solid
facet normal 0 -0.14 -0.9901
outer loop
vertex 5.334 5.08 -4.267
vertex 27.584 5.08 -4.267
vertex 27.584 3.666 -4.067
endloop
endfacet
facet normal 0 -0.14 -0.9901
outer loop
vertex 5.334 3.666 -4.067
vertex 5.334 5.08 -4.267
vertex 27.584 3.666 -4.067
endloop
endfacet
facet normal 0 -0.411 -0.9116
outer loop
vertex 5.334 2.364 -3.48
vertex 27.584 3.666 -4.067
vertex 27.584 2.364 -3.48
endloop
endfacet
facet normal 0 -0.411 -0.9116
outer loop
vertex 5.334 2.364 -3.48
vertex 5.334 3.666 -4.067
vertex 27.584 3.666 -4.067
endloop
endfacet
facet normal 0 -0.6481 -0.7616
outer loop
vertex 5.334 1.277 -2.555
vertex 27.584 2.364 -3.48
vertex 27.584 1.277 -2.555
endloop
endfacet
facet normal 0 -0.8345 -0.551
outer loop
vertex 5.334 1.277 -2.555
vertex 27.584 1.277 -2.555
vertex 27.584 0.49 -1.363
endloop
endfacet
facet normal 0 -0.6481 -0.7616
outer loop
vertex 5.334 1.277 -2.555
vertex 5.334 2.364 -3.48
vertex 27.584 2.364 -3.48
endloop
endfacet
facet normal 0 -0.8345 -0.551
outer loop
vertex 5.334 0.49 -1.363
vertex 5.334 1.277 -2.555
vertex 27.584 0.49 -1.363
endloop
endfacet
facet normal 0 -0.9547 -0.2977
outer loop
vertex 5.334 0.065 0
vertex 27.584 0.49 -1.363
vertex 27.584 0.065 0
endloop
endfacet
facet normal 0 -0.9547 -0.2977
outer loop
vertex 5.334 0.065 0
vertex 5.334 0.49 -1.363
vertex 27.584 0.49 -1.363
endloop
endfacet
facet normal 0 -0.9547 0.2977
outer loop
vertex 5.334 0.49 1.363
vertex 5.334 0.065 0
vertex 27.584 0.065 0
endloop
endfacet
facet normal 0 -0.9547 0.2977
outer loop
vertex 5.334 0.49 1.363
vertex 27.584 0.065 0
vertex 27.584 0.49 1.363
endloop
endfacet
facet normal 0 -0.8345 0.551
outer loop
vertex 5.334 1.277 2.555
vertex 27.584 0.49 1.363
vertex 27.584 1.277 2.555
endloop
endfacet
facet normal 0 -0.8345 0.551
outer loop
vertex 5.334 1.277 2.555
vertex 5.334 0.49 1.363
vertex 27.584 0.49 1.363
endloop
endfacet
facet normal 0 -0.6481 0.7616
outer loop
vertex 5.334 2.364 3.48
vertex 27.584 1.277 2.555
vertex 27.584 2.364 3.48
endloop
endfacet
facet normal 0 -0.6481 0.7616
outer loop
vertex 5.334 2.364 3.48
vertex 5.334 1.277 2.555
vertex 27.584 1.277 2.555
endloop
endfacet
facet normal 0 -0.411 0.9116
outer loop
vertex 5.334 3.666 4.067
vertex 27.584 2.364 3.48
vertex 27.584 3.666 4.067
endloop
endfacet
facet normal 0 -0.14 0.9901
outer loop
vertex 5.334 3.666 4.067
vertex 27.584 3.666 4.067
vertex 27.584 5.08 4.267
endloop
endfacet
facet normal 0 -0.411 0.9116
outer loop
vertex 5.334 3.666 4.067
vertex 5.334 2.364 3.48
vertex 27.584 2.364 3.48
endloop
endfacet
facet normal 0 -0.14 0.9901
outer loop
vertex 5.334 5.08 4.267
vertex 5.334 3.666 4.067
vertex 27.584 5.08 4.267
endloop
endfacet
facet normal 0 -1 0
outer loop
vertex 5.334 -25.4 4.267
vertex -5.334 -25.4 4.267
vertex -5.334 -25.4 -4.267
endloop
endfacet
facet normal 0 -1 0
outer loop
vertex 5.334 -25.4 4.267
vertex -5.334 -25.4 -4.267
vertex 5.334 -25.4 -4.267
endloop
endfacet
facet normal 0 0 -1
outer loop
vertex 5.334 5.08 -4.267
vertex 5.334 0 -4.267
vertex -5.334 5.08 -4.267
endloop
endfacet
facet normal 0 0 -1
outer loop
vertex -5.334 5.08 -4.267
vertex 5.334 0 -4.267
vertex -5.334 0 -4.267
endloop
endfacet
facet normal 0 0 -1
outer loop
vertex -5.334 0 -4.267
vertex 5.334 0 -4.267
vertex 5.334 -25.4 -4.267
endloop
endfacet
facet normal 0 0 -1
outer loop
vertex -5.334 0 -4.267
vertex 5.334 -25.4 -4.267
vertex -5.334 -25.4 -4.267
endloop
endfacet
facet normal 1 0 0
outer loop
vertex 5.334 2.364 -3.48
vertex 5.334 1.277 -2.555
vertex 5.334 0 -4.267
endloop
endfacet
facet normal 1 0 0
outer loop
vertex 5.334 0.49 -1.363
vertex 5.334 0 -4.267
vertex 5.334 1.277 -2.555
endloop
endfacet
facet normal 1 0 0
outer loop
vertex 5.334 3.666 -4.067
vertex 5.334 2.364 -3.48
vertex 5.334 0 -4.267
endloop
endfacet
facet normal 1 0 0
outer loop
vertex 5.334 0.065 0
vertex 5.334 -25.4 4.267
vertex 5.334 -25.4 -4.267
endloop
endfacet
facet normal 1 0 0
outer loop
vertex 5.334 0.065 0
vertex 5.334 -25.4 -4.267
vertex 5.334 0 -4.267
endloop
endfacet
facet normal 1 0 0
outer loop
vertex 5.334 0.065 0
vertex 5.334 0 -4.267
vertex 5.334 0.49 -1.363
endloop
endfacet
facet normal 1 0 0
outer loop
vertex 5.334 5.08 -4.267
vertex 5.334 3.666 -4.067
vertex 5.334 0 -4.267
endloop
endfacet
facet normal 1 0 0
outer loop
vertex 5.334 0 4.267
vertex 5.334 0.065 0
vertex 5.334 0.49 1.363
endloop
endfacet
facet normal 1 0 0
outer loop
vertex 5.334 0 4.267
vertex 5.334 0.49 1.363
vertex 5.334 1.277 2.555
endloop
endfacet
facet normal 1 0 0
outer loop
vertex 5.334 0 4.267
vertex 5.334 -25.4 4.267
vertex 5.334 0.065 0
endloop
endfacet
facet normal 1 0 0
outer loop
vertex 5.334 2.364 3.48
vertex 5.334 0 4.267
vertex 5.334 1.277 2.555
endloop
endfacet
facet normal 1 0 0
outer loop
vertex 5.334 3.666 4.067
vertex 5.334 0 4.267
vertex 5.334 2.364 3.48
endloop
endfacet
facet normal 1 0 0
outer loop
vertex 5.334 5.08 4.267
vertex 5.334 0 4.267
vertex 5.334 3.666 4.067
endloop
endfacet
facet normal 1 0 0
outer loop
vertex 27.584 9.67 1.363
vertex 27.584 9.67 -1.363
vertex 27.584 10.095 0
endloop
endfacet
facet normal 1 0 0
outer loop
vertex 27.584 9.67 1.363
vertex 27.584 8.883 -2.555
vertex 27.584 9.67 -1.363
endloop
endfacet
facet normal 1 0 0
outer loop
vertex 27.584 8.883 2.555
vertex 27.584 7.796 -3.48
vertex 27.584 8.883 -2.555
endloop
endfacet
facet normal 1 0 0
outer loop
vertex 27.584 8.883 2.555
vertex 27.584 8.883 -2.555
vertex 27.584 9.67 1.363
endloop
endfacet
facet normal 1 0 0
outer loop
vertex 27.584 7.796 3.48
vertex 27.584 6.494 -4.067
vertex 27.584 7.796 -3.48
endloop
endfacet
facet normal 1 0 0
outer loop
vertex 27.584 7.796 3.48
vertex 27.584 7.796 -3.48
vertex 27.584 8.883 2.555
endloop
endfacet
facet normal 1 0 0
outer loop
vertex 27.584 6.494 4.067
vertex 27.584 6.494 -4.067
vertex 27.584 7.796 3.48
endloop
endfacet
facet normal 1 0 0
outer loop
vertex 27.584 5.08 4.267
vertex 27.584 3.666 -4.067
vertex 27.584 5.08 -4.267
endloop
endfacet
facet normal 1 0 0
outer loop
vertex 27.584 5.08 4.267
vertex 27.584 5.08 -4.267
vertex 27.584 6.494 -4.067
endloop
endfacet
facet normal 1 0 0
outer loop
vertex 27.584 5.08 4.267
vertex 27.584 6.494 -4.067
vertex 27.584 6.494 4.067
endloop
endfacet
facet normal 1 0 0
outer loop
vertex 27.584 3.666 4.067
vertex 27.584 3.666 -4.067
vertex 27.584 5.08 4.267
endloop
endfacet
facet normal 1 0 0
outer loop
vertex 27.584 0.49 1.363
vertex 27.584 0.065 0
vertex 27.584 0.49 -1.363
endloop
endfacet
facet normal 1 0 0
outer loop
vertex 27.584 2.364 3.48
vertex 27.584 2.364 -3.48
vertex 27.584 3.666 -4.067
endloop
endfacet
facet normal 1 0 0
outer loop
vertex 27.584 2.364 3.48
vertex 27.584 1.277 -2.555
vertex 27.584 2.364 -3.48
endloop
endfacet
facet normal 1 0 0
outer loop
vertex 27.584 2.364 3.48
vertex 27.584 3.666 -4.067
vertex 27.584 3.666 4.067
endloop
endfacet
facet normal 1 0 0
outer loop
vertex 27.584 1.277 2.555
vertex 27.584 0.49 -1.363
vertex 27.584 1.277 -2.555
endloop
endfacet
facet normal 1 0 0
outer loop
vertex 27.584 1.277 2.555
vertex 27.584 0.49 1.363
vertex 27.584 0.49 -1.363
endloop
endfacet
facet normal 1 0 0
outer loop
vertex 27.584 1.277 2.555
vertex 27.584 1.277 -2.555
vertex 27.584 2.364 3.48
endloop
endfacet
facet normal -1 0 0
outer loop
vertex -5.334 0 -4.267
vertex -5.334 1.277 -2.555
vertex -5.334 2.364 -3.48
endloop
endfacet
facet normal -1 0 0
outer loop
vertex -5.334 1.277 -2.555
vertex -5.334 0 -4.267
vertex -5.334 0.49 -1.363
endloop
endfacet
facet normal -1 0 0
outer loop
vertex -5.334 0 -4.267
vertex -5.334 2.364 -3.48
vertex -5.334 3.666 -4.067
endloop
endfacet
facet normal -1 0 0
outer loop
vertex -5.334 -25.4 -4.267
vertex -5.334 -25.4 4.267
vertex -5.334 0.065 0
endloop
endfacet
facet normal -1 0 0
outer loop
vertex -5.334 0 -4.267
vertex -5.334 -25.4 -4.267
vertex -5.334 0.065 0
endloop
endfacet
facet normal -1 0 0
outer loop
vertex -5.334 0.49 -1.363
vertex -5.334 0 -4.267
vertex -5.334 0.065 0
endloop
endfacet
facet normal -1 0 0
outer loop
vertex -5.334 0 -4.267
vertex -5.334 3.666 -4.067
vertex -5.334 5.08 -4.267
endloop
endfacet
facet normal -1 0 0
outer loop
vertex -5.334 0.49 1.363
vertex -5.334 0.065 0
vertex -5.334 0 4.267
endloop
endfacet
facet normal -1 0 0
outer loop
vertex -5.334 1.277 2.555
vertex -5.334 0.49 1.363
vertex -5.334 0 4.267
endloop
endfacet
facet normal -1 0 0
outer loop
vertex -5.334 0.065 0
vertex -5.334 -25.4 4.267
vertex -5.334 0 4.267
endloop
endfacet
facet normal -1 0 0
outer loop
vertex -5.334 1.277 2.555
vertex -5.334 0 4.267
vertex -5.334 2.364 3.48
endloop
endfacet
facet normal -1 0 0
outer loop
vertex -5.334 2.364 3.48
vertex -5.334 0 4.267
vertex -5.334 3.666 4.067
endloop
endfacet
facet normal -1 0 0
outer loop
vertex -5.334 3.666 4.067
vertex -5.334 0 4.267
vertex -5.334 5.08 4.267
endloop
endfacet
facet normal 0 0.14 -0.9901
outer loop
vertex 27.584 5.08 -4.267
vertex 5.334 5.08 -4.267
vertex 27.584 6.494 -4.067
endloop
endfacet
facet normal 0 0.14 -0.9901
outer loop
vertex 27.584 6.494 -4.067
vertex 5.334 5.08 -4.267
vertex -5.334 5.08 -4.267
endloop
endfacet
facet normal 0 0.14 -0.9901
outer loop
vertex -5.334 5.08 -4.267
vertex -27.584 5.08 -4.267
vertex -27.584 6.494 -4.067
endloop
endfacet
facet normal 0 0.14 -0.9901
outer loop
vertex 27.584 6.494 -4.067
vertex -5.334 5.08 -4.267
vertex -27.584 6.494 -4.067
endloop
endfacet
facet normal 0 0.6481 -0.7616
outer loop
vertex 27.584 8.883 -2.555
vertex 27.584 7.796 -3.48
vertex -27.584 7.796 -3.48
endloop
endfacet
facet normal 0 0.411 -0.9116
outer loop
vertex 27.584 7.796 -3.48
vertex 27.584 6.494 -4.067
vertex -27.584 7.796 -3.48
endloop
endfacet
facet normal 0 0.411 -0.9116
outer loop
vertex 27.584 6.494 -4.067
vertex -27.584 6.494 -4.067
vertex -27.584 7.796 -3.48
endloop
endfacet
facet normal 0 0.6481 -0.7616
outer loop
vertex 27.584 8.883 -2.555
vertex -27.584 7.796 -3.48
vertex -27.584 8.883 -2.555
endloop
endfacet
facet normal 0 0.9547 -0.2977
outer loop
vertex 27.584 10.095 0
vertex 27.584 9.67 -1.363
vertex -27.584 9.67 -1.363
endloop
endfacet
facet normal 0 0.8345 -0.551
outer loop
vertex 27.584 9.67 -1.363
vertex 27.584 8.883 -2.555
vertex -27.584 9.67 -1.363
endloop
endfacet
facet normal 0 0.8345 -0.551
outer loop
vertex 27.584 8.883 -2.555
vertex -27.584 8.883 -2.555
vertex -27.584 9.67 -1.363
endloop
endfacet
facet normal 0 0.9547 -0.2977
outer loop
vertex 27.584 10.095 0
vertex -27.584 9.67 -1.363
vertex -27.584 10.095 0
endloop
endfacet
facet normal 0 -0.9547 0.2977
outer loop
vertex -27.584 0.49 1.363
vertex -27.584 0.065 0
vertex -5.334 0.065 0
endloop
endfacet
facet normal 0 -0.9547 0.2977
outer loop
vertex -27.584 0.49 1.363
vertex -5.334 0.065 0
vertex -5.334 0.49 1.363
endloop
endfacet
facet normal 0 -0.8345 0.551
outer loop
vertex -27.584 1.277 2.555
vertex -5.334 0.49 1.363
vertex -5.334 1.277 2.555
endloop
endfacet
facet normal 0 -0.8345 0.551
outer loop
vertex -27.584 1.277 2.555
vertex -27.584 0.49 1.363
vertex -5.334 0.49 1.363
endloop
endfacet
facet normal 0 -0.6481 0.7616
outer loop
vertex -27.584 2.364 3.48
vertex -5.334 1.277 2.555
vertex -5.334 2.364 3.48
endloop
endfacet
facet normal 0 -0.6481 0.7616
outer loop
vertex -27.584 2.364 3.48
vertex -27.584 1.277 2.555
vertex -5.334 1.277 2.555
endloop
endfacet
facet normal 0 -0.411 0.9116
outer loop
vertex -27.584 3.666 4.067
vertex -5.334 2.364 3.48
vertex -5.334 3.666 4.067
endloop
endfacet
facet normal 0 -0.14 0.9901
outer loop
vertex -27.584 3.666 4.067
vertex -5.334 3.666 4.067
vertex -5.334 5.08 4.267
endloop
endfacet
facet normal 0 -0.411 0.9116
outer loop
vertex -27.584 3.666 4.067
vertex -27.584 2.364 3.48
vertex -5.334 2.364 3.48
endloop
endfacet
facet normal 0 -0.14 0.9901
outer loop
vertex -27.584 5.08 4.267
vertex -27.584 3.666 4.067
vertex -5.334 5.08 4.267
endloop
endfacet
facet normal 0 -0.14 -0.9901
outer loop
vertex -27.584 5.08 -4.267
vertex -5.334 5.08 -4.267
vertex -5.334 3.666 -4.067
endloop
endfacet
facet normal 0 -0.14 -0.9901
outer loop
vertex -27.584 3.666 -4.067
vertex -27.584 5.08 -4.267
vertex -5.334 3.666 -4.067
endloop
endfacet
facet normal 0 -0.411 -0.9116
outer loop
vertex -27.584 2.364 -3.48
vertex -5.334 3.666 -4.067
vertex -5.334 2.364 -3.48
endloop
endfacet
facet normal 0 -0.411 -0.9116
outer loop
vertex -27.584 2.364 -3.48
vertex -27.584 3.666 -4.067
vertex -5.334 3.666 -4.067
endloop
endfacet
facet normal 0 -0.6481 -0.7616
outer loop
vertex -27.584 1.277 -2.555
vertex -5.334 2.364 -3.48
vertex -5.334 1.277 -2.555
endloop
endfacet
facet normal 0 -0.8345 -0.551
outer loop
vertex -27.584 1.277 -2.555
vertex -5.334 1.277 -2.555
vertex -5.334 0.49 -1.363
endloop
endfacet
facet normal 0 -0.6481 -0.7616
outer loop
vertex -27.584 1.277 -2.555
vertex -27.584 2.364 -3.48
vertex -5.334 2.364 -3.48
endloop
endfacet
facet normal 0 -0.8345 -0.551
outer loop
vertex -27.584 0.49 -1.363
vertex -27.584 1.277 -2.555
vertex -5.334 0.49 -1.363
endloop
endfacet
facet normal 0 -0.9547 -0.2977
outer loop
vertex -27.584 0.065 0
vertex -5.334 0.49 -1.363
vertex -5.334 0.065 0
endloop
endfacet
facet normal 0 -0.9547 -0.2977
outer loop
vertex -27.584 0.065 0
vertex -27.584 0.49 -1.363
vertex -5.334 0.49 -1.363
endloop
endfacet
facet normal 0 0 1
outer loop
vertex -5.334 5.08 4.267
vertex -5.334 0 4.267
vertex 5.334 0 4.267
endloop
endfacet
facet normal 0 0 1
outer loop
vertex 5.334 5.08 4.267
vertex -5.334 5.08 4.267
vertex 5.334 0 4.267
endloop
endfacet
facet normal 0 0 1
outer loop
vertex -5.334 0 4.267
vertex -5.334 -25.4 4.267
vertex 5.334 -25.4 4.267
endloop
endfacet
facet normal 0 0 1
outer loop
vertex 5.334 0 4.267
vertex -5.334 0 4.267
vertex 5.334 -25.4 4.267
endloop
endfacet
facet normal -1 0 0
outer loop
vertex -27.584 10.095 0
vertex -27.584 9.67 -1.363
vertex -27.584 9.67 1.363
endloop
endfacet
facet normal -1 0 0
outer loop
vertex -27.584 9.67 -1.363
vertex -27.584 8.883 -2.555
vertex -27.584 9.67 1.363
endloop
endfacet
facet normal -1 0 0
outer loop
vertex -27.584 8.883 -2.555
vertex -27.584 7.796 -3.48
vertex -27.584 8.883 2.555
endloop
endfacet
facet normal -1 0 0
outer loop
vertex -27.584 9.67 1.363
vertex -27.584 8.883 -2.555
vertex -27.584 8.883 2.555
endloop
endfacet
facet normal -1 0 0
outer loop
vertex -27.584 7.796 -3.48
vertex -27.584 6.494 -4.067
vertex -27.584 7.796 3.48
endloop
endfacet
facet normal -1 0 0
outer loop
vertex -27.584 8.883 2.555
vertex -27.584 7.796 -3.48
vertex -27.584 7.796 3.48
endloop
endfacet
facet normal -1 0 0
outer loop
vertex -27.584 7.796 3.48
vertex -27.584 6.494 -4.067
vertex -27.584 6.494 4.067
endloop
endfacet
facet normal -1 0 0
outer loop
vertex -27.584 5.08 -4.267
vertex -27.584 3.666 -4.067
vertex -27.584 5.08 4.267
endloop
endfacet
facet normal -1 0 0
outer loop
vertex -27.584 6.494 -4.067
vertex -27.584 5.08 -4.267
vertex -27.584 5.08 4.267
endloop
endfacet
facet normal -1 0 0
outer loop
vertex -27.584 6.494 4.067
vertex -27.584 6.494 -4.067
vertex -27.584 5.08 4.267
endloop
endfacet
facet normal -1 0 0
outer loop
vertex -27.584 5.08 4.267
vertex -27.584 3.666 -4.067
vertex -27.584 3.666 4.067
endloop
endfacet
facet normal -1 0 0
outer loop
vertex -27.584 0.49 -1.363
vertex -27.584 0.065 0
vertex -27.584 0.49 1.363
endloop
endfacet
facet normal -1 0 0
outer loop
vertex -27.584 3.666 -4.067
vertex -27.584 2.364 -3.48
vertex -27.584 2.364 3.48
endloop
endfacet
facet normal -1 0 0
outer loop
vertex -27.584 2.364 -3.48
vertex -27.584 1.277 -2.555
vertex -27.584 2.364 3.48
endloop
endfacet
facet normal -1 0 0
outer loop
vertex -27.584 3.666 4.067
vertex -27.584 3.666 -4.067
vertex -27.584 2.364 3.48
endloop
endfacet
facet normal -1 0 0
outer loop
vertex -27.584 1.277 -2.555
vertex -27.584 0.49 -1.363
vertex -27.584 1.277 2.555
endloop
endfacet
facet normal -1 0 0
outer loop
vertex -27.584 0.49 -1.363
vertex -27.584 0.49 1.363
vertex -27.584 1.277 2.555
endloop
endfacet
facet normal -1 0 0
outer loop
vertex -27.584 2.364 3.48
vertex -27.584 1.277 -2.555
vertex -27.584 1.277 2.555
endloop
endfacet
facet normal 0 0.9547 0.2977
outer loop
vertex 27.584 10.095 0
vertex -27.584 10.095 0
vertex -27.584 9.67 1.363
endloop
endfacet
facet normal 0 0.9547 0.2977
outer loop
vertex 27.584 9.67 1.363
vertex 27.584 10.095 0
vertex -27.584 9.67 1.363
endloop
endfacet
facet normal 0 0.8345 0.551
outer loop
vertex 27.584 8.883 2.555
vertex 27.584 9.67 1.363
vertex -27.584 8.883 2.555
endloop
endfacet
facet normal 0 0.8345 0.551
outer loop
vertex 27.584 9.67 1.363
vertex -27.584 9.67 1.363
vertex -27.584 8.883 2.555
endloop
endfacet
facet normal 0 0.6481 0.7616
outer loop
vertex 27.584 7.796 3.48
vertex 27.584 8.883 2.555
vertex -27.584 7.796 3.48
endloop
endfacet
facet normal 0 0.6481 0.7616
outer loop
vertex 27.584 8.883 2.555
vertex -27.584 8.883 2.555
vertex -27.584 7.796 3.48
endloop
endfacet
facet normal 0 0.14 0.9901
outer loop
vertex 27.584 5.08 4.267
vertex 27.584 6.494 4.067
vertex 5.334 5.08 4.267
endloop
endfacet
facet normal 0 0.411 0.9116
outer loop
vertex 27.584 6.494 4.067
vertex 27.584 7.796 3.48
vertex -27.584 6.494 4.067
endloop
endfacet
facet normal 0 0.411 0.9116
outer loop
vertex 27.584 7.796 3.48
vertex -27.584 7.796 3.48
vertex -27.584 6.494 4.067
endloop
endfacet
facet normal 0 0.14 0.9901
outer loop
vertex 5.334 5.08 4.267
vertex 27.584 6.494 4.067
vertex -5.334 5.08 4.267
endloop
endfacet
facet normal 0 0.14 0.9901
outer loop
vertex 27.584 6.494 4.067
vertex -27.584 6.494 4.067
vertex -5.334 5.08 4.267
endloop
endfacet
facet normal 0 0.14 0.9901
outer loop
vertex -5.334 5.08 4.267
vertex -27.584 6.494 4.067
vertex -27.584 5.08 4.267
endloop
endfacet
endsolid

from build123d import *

# Parameters (mm, degrees)
F0_W         = 10.668002069
F0_H         = 8.5344007239
F1_DEPTH     = 25.4
F2_W         = 22.2503971308
F2_H         = 8.5344007239
F2_W_2       = 10.668002069
F3_DEPTH     = 10.16
F4_T1_DEPTH  = 80.5687963307
F4_T3_DEPTH  = 34.9503971308
F4_T5_DEPTH  = 34.9503971308
F4_T10_DEPTH = 47.6503971308
F4_T15_DEPTH = 47.6503971308
F4_T20_DEPTH = 47.6503971308
F4_T25_DEPTH = 47.6503971308


# Not quite as in the source:
# - a fillet or chamfer that OpenCascade refuses, or shapes differently, is made with other operations: its cross-section is extruded or revolved along the edge and cut away or added


with BuildPart() as f1:
    # F0 (on Front) → F1 (new body)
    with BuildSketch(Plane.XZ):
        Rectangle(F0_W, F0_H)
    extrude(amount=F1_DEPTH)

    # F2 (on face) → F3 (join)
    with BuildSketch(Plane(origin=(0, 0, 0), x_dir=(-1, 0, 0), z_dir=(0, 1, 0))):
        with Locations((-16.4591995999, 0)):
            Rectangle(F2_W, F2_H)
        Rectangle(F2_W_2, F2_H)
        with Locations((16.4591995999, 0)):
            Rectangle(F2_W, F2_H)
    extrude(amount=F3_DEPTH)

    # F4: fillet of radius 5.08 on 6 edges, made by hand

    # F4_s2 → F4_t1 (cut)
    with BuildSketch(Plane.YZ.offset(-40.2843981653)):
        with BuildLine():
            ThreePointArc((10.16, -0.8127996381), (8.6721024484, 2.7793028104), (5.08, 4.2672003619))
            Line((5.08, 4.2672003619), (10.16, 4.2672003619))
            Line((10.16, 4.2672003619), (10.16, -0.8127996381))
        make_face()
        with BuildLine():
            ThreePointArc((5.08, -4.2672003619), (8.6721024484, -2.7793028104), (10.16, 0.8127996381))
            Line((10.16, 0.8127996381), (10.16, -4.2672003619))
            Line((10.16, -4.2672003619), (5.08, -4.2672003619))
        make_face()
    extrude(amount=F4_T1_DEPTH, mode=Mode.SUBTRACT)

    # F4_s4 → F4_t3 (cut)
    with BuildSketch(Plane.YZ.offset(5.3340010345)):
        with BuildLine():
            ThreePointArc((0, -0.8127996381), (1.4878975516, 2.7793028104), (5.08, 4.2672003619))
            Line((5.08, 4.2672003619), (0, 4.2672003619))
            Line((0, 4.2672003619), (0, -0.8127996381))
        make_face()
        with BuildLine():
            ThreePointArc((5.08, -4.2672003619), (1.4878975516, -2.7793028104), (0, 0.8127996381))
            Line((0, 0.8127996381), (0, -4.2672003619))
            Line((0, -4.2672003619), (5.08, -4.2672003619))
        make_face()
    extrude(amount=F4_T3_DEPTH, mode=Mode.SUBTRACT)

    # F4_s6 → F4_t5 (cut)
    with BuildSketch(Plane.YZ.offset(-40.2843981653)):
        with BuildLine():
            ThreePointArc((5.08, -4.2672003619), (1.4878975516, -2.7793028104), (0, 0.8127996381))
            Line((0, 0.8127996381), (0, -4.2672003619))
            Line((0, -4.2672003619), (5.08, -4.2672003619))
        make_face()
        with BuildLine():
            ThreePointArc((0, -0.8127996381), (1.4878975516, 2.7793028104), (5.08, 4.2672003619))
            Line((5.08, 4.2672003619), (0, 4.2672003619))
            Line((0, 4.2672003619), (0, -0.8127996381))
        make_face()
    extrude(amount=F4_T5_DEPTH, mode=Mode.SUBTRACT)


with BuildPart() as f4_tool8:
    # F4_s9 → F4_t10 (new body)
    with BuildSketch(Plane.YZ.offset(-7.3659989655)):
        with BuildLine():
            ThreePointArc((0, -0.8127996381), (1.4878975516, 2.7793028104), (5.08, 4.2672003619))
            Line((5.08, 4.2672003619), (0, 4.2672003619))
            Line((0, 4.2672003619), (0, -0.8127996381))
        make_face()
    extrude(amount=F4_T10_DEPTH)

    split(bisect_by=Plane.YZ.offset(-5.3340010345), keep=Keep.BOTTOM)


with BuildPart() as f1_1:
    add(f1.part)

    # F4_t7: cut F4_tool8
    add(f4_tool8.part, mode=Mode.SUBTRACT)


with BuildPart() as f4_tool13:
    # F4_s14 → F4_t15 (new body)
    with BuildSketch(Plane.YZ.offset(40.2843981653)):
        with BuildLine():
            ThreePointArc((5.08, -4.2672003619), (1.4878975516, -2.7793028104), (0, 0.8127996381))
            Line((0, 0.8127996381), (0, -4.2672003619))
            Line((0, -4.2672003619), (5.08, -4.2672003619))
        make_face()
    extrude(amount=-F4_T15_DEPTH)

    split(bisect_by=Plane.YZ.offset(-5.3340010345), keep=Keep.BOTTOM)


with BuildPart() as f1_2:
    add(f1_1.part)

    # F4_t12: cut F4_tool13
    add(f4_tool13.part, mode=Mode.SUBTRACT)


with BuildPart() as f4_tool18:
    # F4_s19 → F4_t20 (new body)
    with BuildSketch(Plane.YZ.offset(7.3659989655)):
        with BuildLine():
            ThreePointArc((5.08, -4.2672003619), (1.4878975516, -2.7793028104), (0, 0.8127996381))
            Line((0, 0.8127996381), (0, -4.2672003619))
            Line((0, -4.2672003619), (5.08, -4.2672003619))
        make_face()
    extrude(amount=-F4_T20_DEPTH)

    split(bisect_by=Plane.YZ.offset(5.3340010345), keep=Keep.TOP)


with BuildPart() as f1_3:
    add(f1_2.part)

    # F4_t17: cut F4_tool18
    add(f4_tool18.part, mode=Mode.SUBTRACT)


with BuildPart() as f4_tool23:
    # F4_s24 → F4_t25 (new body)
    with BuildSketch(Plane.YZ.offset(-40.2843981653)):
        with BuildLine():
            ThreePointArc((0, -0.8127996381), (1.4878975516, 2.7793028104), (5.08, 4.2672003619))
            Line((5.08, 4.2672003619), (0, 4.2672003619))
            Line((0, 4.2672003619), (0, -0.8127996381))
        make_face()
    extrude(amount=F4_T25_DEPTH)

    split(bisect_by=Plane.YZ.offset(5.3340010345), keep=Keep.TOP)


with BuildPart() as f1_4:
    add(f1_3.part)

    # F4_t22: cut F4_tool23
    add(f4_tool23.part, mode=Mode.SUBTRACT)


solid = f1_4.part
